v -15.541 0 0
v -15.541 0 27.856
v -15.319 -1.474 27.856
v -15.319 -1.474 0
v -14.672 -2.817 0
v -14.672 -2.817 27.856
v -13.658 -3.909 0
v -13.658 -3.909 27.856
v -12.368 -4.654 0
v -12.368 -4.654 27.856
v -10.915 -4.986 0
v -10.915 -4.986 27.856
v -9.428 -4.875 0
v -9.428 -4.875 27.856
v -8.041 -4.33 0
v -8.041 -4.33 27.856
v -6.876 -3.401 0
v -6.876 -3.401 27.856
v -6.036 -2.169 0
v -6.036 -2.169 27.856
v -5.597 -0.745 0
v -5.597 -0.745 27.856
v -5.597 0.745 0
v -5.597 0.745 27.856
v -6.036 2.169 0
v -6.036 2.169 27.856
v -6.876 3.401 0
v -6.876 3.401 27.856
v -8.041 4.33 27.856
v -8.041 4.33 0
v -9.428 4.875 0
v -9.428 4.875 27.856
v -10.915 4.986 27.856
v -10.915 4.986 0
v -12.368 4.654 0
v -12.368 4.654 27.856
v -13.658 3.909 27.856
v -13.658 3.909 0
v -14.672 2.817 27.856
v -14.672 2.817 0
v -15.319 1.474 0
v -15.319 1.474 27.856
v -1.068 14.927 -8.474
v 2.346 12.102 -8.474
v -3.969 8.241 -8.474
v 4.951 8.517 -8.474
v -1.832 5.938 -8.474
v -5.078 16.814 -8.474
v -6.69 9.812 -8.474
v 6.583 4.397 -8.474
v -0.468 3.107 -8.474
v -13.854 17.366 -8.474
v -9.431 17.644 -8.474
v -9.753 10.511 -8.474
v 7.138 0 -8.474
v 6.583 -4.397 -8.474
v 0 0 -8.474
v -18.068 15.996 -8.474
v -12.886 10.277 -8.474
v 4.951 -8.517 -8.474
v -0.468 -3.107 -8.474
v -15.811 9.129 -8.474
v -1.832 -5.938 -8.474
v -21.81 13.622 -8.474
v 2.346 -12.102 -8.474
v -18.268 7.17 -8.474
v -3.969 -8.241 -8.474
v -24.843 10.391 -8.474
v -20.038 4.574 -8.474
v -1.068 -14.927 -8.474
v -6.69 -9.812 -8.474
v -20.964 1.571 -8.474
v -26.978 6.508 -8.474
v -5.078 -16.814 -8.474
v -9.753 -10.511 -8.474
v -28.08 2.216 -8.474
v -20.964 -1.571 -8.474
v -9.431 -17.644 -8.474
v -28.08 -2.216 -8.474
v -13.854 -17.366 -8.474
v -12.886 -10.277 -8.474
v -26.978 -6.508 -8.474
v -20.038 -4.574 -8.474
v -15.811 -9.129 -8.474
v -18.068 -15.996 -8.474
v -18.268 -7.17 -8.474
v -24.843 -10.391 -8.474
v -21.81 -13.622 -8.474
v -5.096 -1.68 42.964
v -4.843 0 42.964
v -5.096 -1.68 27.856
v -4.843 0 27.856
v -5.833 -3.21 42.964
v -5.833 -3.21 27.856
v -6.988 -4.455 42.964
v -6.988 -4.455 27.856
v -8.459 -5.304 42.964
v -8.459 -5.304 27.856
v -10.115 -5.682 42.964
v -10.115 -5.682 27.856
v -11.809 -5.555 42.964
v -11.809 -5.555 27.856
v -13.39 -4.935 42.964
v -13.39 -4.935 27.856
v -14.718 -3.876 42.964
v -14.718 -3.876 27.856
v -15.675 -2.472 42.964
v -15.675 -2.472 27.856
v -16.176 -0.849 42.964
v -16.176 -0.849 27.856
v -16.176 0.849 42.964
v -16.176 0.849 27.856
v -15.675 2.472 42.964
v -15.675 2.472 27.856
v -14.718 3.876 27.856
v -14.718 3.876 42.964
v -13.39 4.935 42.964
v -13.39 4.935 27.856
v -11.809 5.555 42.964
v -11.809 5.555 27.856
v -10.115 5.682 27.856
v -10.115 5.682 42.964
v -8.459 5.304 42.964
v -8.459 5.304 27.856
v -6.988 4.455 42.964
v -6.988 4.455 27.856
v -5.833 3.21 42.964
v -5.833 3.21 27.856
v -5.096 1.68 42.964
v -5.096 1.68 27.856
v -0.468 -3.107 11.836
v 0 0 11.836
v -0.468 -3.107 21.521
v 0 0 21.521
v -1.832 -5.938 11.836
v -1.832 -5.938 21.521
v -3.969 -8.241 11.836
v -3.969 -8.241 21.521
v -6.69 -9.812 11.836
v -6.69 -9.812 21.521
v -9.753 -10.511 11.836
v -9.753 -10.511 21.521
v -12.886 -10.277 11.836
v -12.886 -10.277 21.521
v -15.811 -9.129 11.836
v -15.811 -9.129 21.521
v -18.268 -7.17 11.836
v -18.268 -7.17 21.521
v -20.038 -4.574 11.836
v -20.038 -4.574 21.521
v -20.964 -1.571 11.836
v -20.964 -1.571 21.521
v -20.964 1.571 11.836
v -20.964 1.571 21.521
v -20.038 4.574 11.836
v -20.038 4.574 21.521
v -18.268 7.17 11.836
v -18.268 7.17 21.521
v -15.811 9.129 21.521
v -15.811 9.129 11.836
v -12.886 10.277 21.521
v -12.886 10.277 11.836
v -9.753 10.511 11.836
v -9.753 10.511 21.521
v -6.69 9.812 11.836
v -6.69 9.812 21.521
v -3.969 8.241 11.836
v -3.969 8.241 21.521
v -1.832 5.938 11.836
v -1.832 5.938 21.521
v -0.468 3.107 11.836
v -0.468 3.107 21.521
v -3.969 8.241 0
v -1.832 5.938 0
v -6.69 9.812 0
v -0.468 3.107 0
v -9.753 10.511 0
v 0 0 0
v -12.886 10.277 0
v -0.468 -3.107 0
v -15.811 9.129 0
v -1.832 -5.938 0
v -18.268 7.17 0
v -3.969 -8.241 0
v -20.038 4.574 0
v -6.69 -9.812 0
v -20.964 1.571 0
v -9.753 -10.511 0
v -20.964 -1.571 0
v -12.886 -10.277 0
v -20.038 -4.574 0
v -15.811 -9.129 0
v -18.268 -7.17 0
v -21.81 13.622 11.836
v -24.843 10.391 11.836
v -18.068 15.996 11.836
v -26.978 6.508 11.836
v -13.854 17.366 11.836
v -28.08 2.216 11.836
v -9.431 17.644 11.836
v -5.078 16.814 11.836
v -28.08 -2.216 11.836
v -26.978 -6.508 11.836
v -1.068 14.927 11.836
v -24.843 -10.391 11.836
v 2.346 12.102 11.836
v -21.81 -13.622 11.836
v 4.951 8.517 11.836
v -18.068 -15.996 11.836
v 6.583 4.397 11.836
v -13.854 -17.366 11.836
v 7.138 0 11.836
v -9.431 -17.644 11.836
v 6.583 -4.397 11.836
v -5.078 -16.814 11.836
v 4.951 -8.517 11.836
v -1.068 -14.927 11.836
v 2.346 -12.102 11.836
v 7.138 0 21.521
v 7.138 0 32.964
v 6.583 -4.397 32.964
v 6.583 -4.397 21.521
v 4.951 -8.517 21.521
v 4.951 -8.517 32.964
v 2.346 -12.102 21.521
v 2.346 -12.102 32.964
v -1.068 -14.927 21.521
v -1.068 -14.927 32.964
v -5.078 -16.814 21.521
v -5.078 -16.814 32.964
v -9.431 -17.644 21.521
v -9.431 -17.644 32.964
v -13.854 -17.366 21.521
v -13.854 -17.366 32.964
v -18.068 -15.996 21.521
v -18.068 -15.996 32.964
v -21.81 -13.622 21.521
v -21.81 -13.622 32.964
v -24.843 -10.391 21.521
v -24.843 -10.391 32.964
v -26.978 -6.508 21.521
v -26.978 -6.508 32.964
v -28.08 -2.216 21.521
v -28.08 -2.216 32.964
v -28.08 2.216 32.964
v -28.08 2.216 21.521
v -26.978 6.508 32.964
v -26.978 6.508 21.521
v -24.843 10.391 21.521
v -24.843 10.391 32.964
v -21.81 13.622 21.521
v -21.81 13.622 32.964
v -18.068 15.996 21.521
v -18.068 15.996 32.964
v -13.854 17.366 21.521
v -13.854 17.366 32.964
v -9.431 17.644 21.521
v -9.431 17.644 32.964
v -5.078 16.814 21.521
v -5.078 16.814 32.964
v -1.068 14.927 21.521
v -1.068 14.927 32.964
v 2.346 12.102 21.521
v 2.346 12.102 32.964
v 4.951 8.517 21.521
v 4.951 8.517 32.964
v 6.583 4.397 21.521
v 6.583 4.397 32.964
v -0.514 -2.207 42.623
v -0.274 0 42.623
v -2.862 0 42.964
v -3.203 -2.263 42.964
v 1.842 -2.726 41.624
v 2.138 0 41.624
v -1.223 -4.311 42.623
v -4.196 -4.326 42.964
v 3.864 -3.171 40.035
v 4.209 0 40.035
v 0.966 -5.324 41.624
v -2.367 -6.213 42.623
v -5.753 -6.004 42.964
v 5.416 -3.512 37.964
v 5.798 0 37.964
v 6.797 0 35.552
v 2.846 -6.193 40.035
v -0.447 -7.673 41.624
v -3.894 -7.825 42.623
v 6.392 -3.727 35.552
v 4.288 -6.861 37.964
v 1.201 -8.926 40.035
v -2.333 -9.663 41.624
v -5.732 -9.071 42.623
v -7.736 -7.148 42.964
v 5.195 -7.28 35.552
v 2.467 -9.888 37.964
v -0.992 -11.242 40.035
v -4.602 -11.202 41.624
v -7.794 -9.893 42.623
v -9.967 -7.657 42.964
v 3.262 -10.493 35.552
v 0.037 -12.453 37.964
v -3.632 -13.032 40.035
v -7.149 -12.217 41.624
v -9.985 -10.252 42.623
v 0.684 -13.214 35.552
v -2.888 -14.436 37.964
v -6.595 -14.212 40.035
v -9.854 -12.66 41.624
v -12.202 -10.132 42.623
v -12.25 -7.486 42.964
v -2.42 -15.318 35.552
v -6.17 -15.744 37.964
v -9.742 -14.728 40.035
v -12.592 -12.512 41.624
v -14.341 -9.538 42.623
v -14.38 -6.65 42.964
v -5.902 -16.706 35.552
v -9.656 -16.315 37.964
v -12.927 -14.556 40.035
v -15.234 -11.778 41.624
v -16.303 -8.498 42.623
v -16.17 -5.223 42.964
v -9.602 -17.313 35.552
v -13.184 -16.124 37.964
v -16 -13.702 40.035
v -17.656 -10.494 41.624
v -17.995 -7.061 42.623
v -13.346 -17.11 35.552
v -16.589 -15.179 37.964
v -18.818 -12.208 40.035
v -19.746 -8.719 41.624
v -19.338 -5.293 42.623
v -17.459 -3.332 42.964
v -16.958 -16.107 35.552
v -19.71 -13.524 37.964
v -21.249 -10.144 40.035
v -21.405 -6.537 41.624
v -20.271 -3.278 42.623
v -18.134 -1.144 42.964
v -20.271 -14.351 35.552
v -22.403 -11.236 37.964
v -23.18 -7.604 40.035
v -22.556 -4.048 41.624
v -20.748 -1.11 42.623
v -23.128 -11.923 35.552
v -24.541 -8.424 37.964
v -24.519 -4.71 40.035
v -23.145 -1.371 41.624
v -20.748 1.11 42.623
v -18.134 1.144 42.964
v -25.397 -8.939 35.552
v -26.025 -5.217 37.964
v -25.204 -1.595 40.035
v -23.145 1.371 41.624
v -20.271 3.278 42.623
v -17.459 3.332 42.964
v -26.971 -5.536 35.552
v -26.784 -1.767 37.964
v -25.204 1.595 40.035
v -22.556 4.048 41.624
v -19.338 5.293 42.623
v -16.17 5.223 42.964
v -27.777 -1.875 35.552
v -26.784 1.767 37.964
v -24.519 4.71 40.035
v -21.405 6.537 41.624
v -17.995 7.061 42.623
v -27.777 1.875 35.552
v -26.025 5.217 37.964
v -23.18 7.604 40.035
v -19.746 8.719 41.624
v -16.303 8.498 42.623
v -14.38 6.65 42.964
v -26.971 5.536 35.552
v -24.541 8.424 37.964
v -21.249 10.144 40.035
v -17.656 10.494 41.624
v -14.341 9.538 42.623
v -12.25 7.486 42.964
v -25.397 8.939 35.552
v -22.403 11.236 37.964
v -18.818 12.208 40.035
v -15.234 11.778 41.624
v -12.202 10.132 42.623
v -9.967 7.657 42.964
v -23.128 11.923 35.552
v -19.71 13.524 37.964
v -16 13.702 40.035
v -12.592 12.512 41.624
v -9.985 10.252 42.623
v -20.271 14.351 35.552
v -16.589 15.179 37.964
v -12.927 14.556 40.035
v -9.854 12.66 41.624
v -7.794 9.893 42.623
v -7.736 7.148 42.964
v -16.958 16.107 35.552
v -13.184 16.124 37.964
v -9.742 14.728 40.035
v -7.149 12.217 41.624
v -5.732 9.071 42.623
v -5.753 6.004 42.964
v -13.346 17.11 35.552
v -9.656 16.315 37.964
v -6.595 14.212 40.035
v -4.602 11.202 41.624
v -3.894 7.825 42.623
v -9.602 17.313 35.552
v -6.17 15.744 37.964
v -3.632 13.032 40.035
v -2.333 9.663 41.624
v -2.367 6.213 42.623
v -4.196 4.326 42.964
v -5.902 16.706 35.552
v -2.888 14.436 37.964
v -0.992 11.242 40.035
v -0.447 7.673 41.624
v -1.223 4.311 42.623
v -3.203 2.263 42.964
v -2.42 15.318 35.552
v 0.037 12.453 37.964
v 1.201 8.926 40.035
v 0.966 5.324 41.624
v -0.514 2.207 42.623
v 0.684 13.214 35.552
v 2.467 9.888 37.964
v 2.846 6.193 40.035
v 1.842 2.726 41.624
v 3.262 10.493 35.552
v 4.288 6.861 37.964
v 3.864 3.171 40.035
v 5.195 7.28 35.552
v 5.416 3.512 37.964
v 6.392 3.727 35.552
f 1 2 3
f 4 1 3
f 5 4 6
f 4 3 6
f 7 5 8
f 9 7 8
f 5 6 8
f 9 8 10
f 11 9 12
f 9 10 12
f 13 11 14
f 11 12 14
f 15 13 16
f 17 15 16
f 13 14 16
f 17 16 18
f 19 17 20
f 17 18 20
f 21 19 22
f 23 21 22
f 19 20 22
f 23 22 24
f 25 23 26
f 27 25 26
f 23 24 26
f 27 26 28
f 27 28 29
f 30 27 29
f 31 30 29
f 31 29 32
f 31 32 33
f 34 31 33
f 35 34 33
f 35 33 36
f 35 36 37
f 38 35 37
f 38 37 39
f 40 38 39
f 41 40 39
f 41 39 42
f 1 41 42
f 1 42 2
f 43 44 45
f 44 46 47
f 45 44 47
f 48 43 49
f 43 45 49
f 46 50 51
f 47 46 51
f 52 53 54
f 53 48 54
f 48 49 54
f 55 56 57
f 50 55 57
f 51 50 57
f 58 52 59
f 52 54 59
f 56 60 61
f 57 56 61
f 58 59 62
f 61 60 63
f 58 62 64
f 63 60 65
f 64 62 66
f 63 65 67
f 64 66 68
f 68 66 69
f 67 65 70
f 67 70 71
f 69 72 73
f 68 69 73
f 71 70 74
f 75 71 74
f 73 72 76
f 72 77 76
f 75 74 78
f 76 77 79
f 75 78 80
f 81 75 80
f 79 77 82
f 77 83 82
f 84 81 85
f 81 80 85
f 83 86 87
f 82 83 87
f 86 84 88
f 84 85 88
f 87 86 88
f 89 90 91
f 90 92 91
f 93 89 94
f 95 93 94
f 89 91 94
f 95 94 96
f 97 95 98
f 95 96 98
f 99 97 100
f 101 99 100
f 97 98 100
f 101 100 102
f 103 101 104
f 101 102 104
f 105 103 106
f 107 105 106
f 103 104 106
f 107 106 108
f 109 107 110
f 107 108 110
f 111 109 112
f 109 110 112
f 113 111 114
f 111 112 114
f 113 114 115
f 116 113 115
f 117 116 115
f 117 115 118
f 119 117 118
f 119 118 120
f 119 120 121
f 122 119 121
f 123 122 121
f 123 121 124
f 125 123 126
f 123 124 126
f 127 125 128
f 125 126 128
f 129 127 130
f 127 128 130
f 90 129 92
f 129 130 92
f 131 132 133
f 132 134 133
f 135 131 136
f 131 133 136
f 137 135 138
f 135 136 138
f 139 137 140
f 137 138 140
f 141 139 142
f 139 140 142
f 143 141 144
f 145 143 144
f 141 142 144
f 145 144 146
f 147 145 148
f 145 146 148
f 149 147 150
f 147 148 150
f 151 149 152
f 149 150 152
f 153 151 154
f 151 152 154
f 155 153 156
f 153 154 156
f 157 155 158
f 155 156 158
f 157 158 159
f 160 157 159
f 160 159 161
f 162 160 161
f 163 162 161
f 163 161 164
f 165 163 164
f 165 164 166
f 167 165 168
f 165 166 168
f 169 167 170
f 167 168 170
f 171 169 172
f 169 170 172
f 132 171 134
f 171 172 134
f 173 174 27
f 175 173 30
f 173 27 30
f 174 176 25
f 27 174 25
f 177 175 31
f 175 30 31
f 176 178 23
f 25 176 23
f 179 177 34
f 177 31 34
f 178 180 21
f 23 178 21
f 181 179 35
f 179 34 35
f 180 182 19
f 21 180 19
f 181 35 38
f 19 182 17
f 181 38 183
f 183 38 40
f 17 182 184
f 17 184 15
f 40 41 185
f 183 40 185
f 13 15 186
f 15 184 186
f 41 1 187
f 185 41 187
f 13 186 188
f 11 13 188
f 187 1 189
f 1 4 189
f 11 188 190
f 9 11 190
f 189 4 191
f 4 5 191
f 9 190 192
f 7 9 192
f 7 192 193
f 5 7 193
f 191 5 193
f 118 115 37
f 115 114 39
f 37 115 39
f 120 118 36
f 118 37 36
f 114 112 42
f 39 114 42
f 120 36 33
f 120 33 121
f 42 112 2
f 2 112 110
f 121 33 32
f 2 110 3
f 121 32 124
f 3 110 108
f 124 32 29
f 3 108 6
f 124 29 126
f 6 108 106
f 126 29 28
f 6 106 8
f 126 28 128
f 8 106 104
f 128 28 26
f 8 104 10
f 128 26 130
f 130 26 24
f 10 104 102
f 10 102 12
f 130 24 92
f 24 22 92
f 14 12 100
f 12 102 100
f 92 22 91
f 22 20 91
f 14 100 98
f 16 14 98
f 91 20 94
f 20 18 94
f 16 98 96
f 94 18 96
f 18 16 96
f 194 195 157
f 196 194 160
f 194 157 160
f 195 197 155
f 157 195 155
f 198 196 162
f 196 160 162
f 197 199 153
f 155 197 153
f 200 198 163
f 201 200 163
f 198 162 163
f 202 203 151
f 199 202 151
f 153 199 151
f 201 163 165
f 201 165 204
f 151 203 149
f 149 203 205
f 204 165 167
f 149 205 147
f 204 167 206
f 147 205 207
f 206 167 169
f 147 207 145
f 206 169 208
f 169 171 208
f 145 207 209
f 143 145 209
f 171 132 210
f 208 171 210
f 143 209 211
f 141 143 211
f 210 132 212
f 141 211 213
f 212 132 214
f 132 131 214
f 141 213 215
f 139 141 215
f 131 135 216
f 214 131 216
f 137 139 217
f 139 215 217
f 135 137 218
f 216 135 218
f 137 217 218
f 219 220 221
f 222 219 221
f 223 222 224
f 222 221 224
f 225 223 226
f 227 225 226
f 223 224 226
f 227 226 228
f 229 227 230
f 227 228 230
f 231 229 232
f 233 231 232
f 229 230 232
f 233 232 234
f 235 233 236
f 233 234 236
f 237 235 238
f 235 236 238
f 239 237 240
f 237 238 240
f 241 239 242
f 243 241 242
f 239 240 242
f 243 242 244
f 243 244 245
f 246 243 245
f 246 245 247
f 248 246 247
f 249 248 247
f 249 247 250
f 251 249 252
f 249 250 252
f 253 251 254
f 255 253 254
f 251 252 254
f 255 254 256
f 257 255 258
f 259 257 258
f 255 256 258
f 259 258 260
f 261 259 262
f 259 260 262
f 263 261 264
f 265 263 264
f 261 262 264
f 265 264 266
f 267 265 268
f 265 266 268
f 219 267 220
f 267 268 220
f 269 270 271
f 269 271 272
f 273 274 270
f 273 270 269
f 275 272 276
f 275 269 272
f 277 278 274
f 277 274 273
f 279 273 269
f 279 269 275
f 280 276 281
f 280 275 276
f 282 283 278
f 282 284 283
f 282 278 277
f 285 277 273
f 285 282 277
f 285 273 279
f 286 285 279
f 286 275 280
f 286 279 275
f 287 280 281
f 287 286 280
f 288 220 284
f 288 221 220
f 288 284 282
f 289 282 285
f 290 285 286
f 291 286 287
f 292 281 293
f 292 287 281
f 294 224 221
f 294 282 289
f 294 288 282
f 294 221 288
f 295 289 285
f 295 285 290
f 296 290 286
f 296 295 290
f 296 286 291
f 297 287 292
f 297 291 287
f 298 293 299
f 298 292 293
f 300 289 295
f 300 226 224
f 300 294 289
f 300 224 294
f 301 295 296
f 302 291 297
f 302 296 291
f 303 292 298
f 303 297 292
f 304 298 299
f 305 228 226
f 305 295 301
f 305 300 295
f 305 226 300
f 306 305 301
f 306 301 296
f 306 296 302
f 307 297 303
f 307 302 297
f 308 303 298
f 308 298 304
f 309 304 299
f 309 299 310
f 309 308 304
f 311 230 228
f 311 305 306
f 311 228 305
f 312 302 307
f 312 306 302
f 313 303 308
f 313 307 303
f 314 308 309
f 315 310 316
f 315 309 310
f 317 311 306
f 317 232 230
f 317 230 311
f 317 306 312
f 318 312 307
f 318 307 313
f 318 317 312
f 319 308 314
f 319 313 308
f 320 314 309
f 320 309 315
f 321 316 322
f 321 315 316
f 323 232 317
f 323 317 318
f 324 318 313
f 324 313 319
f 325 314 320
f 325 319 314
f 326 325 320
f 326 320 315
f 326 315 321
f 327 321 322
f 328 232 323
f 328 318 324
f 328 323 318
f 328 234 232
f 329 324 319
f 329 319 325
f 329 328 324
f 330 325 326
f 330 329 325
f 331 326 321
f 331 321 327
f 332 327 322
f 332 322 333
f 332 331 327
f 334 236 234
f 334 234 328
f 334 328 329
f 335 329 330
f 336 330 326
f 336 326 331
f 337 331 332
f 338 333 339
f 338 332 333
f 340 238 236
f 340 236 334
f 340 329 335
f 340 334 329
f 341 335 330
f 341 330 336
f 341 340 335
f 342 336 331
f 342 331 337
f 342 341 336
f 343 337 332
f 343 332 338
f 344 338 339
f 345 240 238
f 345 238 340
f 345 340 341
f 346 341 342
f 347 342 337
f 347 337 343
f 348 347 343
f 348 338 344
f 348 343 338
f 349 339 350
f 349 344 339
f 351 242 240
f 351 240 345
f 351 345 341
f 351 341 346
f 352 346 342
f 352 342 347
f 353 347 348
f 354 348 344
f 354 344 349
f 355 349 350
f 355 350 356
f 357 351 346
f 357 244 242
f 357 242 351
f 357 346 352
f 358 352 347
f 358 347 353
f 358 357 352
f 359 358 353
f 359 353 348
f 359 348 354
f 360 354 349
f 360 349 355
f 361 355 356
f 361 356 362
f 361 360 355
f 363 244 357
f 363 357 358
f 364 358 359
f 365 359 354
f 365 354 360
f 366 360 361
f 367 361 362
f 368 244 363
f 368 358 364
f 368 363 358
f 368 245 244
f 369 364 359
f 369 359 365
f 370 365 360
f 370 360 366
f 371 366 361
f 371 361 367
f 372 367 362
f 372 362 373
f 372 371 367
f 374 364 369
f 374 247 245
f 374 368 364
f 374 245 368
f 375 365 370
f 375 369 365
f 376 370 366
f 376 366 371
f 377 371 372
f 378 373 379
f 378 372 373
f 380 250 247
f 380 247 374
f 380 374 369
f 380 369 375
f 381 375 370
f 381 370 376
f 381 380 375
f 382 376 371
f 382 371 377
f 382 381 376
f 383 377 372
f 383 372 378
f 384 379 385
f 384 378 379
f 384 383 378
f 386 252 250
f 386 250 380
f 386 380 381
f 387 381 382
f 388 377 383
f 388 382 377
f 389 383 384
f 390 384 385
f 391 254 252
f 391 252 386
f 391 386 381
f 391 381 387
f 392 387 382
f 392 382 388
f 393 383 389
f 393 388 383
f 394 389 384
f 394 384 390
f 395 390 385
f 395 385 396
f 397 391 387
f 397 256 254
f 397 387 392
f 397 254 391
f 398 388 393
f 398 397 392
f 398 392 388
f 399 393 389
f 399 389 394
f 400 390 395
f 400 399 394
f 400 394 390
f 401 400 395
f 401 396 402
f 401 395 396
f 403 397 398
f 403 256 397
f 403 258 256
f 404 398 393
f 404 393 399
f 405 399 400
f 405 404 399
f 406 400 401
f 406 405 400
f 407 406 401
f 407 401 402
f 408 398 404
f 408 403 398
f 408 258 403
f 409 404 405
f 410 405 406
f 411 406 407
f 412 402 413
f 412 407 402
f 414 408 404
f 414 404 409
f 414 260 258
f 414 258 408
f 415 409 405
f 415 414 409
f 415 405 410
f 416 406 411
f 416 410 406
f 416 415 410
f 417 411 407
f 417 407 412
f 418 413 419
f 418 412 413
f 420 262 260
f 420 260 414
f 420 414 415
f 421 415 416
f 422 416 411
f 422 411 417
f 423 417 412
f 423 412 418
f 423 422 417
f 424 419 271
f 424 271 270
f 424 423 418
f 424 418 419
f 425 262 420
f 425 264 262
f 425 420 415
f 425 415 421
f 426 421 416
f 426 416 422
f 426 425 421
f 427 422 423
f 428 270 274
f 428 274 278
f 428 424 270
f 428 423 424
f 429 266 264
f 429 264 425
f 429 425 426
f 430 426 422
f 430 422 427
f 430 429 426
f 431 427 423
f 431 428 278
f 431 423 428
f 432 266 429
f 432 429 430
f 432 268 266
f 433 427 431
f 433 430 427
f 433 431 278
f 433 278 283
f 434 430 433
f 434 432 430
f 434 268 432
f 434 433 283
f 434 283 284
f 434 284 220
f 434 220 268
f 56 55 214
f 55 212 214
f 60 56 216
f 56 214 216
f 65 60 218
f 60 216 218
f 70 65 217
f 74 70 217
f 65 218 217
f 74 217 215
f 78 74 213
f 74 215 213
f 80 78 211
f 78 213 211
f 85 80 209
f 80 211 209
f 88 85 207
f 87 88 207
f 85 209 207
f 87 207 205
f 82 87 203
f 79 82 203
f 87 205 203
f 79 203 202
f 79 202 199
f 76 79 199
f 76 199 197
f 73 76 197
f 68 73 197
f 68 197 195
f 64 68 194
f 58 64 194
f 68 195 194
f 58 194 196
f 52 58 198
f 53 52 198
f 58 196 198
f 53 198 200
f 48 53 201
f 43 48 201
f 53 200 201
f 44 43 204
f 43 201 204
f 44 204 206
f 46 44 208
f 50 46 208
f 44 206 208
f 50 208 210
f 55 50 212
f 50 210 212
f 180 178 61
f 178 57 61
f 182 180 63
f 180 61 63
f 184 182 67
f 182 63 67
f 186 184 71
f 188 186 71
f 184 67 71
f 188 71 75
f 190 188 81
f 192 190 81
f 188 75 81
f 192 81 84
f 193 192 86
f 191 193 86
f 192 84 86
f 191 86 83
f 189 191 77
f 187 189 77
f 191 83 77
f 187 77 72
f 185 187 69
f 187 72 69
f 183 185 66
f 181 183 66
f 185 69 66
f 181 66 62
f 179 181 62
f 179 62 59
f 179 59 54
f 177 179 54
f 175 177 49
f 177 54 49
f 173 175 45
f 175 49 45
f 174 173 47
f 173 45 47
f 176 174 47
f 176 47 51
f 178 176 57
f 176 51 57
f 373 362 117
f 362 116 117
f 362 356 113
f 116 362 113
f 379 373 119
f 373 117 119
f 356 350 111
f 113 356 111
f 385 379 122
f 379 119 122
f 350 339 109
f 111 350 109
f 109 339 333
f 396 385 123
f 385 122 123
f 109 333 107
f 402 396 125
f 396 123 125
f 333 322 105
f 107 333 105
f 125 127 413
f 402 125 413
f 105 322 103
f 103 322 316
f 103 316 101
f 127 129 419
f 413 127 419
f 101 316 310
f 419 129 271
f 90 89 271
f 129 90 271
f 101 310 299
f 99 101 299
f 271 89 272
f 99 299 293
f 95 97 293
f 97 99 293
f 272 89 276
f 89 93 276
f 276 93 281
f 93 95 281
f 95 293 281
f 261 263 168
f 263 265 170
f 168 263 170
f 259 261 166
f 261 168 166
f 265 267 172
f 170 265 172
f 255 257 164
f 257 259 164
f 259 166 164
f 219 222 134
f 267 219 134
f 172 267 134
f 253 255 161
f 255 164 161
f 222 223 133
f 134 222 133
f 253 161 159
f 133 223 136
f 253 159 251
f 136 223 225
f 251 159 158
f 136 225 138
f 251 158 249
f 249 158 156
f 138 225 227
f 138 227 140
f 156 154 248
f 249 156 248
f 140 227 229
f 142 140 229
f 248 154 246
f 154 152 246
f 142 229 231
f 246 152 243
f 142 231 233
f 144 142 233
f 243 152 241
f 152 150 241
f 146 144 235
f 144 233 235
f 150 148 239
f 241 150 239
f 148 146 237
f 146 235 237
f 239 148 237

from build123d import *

# Parameters (mm, degrees)
F3_D = 10
F4_R = 10


with BuildPart() as f1:
    # F0 (on Front) → F1 (revolve)
    with BuildSketch(Plane.XZ):
        Polygon((7.1379574947, 42.9636351764), (-4.8425933346, 42.9636351764), (-4.8425933346, 27.8560947627), (-10.5409119278, 27.8560947627), (-10.5409119278, 0), (0, 0), (0, -8.4736431018), (7.1379574947, -8.4736431018), (7.1379574947, 11.8357595056), (0, 11.8357595056), (0, 21.5210486203), (7.1379574947, 21.5210486203), align=None)
    revolve(axis=Axis((-10.5409119278, 0, 16.1306988448), (0, 0, -1)))

    # F3 (through all)
    with Locations(Plane(origin=(0, 0, 0), x_dir=(1, 0, 0), z_dir=(0, 0, -1))):
        with Locations((-10.5409119278, 0)):
            Hole(F3_D / 2)

    # F4
    f4_edges = [f1.edges().sort_by_distance(p)[0] for p in [
        (-28.219781, 0, 42.963635),
    ]]
    fillet(f4_edges, radius=F4_R)


solid = f1.part
